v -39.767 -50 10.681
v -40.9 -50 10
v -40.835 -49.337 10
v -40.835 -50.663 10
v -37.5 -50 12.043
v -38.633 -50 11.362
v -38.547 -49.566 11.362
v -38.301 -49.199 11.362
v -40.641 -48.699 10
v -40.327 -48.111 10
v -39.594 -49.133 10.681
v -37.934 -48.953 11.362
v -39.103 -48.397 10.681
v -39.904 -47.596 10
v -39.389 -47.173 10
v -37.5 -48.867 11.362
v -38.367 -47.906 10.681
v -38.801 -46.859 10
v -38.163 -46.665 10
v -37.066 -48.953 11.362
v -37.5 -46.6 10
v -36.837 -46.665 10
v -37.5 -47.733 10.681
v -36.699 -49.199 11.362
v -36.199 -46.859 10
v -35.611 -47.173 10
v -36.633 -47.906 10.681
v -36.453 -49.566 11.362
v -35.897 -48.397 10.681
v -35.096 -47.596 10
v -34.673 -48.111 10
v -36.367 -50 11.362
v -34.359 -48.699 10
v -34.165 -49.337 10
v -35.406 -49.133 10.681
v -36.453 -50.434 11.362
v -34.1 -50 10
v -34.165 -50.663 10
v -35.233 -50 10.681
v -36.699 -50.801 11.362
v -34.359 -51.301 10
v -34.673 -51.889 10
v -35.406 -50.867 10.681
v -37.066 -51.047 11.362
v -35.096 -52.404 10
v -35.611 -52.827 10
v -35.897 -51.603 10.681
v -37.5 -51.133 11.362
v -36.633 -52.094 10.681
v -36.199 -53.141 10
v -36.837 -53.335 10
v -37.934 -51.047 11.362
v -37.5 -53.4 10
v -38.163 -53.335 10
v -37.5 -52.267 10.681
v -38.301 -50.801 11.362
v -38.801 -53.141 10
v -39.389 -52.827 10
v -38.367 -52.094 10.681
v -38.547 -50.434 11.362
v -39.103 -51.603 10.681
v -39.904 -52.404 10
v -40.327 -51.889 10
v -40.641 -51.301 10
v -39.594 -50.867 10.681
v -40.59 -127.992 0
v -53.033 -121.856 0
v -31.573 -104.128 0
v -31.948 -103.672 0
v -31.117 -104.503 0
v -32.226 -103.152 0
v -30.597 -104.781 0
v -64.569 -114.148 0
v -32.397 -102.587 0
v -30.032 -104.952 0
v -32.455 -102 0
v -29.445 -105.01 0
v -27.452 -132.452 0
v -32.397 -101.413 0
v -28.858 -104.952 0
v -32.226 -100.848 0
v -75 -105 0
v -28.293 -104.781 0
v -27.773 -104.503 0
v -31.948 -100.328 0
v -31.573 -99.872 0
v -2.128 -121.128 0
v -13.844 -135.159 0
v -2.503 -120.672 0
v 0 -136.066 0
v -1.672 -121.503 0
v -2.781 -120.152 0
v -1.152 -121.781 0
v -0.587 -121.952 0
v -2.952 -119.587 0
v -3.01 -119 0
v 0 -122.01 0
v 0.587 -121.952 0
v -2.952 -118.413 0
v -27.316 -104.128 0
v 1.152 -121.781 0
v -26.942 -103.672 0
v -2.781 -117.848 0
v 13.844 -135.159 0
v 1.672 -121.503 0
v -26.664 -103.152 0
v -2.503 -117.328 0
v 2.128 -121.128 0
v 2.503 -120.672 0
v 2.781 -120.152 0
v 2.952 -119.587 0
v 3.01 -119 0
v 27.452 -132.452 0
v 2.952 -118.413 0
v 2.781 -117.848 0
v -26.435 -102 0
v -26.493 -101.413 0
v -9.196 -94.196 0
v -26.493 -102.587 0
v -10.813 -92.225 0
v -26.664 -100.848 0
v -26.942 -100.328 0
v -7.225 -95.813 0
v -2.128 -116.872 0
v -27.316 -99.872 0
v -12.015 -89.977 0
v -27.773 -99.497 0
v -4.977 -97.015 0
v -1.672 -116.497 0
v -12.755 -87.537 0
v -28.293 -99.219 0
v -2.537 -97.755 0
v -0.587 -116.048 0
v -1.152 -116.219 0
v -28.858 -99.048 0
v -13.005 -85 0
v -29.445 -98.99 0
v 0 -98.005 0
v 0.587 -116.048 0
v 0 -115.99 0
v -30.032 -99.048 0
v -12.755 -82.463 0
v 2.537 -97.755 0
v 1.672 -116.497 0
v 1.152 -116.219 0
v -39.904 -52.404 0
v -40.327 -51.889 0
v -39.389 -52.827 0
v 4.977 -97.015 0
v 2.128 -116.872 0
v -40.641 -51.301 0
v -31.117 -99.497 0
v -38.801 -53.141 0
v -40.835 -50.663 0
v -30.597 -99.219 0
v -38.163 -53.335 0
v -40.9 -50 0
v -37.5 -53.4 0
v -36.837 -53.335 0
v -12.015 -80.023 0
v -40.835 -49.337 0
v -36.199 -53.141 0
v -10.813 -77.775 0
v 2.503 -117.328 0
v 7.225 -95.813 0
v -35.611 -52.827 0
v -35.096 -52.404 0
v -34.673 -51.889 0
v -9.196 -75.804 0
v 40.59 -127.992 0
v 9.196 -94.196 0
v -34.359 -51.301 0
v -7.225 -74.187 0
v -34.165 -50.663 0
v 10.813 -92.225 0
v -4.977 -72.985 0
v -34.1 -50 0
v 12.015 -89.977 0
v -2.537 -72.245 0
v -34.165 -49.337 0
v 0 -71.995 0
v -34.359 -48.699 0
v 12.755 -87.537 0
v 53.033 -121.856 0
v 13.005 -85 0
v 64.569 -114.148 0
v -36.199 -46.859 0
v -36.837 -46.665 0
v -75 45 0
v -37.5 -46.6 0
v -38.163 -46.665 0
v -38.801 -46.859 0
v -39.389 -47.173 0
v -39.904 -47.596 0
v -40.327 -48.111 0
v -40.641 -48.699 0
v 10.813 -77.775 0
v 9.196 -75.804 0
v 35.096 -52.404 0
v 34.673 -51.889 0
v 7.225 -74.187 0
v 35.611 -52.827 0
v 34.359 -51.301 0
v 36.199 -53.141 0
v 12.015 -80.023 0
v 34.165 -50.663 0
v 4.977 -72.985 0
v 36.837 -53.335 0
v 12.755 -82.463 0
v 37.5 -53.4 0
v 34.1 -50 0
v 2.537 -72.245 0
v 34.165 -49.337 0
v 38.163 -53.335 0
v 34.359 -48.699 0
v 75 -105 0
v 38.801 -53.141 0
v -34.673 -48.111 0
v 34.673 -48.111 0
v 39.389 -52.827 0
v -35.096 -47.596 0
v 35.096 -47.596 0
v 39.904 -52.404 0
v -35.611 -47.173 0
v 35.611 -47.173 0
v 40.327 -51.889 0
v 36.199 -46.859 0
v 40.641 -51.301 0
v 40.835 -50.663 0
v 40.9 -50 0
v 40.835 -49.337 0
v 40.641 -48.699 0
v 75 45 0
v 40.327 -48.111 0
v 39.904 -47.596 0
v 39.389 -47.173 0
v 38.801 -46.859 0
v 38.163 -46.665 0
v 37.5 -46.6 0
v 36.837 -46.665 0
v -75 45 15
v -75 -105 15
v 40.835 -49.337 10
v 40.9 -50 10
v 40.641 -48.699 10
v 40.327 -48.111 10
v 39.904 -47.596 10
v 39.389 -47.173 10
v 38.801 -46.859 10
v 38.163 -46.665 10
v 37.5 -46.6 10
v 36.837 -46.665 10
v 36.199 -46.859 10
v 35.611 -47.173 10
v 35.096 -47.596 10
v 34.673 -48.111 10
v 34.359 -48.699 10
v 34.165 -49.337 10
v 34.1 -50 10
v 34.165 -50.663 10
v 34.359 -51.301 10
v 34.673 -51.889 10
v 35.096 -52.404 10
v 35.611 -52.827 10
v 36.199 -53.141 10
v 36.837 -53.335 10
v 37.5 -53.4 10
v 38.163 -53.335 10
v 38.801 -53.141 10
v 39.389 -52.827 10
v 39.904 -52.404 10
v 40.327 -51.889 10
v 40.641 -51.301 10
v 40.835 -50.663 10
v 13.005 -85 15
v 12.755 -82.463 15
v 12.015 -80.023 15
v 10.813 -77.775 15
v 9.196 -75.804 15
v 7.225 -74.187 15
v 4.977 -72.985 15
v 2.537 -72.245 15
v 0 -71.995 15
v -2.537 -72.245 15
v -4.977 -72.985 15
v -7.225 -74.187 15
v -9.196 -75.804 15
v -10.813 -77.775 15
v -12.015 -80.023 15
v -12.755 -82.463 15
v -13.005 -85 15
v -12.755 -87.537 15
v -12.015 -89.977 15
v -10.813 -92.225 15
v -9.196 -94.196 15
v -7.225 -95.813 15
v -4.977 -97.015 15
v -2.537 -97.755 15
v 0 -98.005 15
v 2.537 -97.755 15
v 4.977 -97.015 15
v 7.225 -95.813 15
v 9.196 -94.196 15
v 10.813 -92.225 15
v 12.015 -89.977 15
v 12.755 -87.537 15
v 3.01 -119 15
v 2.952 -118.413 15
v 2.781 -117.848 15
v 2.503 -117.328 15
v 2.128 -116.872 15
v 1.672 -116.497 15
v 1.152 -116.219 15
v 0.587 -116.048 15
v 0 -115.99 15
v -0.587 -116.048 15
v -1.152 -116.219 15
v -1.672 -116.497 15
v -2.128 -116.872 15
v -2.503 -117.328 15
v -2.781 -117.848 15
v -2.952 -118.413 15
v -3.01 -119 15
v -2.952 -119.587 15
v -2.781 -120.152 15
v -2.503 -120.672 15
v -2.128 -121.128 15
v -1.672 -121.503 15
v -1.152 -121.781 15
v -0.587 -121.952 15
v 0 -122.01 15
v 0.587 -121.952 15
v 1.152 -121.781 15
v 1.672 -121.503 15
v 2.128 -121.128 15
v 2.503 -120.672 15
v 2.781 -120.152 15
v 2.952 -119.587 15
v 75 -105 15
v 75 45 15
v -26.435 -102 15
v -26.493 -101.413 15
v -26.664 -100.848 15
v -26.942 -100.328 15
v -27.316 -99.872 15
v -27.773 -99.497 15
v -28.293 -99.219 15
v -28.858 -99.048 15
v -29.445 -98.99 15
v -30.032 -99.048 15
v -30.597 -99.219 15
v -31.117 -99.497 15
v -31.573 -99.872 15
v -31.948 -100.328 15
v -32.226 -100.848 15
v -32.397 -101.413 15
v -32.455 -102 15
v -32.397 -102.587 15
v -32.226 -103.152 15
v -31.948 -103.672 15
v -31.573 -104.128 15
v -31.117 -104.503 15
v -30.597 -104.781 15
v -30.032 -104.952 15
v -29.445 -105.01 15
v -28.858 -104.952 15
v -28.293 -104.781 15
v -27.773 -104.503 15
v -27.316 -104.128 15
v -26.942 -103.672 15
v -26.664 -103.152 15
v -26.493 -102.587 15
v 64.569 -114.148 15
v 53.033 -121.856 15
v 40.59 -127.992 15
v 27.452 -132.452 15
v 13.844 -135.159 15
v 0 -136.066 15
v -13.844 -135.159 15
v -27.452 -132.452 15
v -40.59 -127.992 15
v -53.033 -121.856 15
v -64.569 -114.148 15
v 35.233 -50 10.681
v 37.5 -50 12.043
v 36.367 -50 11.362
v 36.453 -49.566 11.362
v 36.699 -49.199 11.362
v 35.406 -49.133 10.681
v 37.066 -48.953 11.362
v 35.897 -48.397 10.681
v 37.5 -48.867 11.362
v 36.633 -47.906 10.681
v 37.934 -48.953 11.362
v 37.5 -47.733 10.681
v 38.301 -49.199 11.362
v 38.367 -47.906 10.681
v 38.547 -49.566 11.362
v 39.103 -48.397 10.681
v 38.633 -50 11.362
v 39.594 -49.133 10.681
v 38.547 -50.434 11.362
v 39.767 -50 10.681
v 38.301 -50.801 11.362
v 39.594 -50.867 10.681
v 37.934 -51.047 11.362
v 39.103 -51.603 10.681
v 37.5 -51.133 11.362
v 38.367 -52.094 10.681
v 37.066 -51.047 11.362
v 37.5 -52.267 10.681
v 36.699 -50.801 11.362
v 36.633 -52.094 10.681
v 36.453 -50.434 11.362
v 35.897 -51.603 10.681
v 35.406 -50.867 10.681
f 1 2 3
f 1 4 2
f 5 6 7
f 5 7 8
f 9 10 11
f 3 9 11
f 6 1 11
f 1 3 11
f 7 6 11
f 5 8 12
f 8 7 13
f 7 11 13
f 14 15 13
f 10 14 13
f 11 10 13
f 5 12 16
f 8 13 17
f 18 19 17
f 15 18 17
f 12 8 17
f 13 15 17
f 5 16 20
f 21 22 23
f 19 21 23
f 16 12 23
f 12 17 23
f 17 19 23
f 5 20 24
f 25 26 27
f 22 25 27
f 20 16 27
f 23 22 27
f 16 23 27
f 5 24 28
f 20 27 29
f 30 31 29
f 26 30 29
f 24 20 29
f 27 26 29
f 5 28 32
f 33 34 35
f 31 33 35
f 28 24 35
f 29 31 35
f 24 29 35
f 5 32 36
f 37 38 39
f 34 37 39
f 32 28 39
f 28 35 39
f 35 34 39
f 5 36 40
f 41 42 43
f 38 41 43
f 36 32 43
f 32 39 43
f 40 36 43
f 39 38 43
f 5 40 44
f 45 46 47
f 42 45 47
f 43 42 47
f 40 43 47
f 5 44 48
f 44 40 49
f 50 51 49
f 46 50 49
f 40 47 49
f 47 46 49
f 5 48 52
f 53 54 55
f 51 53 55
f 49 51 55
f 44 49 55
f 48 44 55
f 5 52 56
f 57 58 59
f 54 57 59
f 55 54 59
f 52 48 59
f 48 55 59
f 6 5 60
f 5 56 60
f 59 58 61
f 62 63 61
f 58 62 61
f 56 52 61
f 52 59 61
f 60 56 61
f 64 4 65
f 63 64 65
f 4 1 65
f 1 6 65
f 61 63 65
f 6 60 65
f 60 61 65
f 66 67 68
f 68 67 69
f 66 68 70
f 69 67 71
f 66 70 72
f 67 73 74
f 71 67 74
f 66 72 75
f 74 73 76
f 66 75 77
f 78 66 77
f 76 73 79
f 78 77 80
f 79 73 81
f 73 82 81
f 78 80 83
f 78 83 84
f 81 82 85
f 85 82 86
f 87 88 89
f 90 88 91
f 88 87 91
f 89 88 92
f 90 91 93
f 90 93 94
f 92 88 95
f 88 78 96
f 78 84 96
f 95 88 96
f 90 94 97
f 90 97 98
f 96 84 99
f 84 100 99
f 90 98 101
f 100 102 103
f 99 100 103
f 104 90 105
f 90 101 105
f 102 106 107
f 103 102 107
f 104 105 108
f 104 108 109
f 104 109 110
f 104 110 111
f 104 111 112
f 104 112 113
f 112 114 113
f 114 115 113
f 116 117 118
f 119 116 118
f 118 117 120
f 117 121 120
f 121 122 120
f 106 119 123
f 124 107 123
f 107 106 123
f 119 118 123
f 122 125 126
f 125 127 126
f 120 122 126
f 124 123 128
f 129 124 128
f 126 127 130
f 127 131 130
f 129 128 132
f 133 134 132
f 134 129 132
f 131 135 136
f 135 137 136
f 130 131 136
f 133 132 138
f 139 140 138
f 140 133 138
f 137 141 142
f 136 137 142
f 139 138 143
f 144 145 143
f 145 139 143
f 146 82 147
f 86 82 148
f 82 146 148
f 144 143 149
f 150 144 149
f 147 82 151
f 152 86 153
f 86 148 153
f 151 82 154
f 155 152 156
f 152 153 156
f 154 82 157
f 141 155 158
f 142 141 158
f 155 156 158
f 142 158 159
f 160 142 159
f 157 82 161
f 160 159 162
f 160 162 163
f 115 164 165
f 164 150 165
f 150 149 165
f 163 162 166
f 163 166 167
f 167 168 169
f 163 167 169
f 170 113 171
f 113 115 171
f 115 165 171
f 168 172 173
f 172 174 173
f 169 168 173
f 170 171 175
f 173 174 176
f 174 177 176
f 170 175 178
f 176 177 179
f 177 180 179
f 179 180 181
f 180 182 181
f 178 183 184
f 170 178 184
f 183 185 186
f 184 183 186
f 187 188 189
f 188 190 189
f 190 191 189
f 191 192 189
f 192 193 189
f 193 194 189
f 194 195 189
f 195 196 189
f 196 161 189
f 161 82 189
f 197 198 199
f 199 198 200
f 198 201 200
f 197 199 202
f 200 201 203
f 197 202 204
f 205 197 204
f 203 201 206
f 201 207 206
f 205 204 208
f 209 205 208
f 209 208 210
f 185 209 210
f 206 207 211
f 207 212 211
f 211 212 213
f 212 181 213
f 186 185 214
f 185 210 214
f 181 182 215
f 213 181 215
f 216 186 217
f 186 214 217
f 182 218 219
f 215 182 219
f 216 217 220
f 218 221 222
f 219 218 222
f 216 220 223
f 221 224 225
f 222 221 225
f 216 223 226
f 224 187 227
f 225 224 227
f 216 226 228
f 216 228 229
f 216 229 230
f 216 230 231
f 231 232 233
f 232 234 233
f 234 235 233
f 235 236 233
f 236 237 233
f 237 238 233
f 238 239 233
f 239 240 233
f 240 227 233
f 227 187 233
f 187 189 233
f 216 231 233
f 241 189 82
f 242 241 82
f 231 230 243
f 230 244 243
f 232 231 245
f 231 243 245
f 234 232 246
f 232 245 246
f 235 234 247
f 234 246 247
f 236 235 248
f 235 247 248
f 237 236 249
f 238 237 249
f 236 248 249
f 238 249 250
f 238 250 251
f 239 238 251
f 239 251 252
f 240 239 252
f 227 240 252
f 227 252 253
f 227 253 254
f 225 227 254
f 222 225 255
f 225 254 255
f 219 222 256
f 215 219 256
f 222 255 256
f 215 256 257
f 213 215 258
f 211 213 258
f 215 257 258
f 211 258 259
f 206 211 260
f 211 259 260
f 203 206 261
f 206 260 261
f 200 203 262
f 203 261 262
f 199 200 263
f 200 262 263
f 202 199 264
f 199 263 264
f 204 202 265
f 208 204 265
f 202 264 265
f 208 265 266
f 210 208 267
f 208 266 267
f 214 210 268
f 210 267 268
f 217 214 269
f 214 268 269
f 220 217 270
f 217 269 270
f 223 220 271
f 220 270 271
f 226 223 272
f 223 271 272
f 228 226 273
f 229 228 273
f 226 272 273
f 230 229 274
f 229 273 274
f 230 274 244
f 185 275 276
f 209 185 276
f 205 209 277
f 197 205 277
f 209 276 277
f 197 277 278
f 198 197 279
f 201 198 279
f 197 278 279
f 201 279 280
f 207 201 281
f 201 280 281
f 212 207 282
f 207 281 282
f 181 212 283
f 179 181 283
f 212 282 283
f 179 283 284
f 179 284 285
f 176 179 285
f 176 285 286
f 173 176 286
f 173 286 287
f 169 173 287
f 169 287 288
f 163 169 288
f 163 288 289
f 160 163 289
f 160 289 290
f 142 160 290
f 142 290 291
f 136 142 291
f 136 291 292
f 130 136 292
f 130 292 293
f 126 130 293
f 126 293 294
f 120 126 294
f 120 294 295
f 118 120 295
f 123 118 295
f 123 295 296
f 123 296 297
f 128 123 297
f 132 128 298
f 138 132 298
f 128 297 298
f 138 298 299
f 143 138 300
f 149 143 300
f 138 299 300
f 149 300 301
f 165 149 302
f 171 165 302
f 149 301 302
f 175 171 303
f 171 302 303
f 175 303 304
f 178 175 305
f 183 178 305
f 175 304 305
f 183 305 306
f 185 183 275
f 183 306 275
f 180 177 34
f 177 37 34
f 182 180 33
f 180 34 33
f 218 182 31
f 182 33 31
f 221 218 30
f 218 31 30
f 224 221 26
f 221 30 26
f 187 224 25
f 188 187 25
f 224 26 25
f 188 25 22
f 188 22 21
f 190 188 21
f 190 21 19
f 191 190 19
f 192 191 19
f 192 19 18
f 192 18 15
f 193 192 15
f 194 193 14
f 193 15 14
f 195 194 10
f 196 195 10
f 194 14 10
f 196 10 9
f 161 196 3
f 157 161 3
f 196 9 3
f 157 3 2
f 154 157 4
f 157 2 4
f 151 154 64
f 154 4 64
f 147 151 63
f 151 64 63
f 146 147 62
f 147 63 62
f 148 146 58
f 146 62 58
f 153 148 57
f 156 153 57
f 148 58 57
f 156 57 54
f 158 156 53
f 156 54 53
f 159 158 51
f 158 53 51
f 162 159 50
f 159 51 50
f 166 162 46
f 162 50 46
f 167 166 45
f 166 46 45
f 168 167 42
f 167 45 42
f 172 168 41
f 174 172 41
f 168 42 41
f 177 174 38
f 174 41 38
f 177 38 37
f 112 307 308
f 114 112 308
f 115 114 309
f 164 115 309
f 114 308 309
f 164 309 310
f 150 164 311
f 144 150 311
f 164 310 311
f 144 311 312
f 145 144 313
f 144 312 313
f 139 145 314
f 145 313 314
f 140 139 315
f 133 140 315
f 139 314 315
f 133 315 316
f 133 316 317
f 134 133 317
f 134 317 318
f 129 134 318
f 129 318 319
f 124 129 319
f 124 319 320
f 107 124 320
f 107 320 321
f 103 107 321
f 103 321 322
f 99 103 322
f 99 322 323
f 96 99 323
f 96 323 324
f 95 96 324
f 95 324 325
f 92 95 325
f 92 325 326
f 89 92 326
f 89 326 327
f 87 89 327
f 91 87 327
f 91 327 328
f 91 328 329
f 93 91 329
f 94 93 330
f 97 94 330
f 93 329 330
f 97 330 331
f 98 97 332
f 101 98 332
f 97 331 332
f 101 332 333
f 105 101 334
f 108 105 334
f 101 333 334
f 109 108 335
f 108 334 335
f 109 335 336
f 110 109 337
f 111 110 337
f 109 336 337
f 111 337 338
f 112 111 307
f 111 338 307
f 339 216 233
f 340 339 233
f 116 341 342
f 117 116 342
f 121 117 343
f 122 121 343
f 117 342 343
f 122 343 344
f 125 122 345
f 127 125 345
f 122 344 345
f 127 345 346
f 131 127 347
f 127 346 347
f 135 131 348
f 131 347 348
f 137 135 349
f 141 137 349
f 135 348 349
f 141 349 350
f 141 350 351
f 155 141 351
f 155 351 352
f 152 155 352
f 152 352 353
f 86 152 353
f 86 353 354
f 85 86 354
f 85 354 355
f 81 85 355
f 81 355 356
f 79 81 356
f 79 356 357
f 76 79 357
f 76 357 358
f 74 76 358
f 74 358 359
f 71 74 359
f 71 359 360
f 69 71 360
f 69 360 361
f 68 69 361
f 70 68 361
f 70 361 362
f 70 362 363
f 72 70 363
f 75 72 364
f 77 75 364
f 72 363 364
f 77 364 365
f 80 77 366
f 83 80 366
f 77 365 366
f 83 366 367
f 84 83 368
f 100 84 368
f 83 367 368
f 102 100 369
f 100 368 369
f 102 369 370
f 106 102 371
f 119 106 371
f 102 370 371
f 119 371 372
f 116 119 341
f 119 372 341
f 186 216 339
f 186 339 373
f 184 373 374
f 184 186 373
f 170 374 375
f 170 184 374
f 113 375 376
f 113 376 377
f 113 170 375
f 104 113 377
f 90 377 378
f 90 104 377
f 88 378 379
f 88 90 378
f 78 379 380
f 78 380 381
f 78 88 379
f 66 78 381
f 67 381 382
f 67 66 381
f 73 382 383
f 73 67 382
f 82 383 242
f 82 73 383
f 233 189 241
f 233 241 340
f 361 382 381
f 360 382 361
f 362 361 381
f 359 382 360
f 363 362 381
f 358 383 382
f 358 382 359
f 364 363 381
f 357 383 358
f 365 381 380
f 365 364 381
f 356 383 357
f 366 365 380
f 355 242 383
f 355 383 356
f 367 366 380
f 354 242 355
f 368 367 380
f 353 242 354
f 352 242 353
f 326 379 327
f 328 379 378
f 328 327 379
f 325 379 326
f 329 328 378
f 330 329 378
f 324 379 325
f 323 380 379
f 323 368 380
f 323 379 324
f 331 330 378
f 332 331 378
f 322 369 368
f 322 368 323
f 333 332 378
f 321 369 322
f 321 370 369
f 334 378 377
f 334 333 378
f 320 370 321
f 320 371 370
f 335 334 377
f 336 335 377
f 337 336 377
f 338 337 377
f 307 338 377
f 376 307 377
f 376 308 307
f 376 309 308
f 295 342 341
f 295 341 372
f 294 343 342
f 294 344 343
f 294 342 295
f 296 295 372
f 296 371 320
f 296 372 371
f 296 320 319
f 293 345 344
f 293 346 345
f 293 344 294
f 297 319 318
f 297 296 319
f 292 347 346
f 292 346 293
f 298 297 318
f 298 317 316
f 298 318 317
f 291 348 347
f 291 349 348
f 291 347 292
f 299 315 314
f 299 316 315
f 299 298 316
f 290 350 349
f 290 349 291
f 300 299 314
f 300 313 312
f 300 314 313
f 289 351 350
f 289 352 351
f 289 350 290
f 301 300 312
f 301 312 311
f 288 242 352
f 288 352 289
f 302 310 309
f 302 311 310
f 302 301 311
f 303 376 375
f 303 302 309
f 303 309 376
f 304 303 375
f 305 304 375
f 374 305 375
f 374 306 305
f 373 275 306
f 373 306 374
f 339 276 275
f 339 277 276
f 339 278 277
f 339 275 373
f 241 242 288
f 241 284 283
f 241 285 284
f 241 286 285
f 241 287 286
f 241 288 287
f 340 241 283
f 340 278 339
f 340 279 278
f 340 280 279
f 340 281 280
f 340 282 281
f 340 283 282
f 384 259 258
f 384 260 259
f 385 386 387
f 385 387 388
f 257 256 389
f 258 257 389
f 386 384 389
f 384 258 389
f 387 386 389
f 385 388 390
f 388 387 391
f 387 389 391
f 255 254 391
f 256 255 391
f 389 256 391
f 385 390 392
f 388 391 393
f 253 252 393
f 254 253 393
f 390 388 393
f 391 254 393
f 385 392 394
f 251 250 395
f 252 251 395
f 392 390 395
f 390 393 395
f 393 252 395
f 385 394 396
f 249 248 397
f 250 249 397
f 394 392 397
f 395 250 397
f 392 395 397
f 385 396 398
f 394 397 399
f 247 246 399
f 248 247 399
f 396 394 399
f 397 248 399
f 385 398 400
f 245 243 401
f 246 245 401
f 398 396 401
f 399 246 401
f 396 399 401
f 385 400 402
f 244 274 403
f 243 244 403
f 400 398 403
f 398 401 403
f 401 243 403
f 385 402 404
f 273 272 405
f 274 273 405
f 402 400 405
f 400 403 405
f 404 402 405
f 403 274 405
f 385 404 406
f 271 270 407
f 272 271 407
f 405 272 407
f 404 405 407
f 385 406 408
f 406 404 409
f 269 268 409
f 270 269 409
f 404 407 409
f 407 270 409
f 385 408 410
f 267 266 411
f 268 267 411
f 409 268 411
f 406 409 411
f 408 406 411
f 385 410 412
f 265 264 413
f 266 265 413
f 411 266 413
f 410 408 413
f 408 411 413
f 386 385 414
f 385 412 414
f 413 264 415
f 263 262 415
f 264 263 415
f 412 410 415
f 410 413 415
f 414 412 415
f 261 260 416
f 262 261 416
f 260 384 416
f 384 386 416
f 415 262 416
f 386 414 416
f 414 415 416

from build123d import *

# Parameters (mm, degrees)
SKETCH2_W                        = 150
SKETCH2_H                        = 90
SKETCH2_H_2                      = 60
BOSS_EXTRUDE1_DEPTH              = 15
SKETCH3_R                        = 13.005
SKETCH3_R_2                      = 3.01
CUT_EXTRUDE1_DEPTH               = 16
TAP_DRILL_FOR_M8X1_25_TAP1_D     = 6.8
TAP_DRILL_FOR_M8X1_25_TAP1_DEPTH = 10
TAP_DRILL_FOR_M8X1_25_TAP1_TIP   = 2.042926105


with BuildPart() as part:
    # Sketch2 → Boss-Extrude1 (new body)
    with BuildSketch(Plane.XY):
        Rectangle(SKETCH2_W, SKETCH2_H)
        with Locations((0, -75)):
            Rectangle(SKETCH2_W, SKETCH2_H_2)
        with BuildLine():
            Line((-75, -105), (75, -105))
            ThreePointArc((75, -105), (0, -136.066017178), (-75, -105))
        make_face()
    extrude(amount=BOSS_EXTRUDE1_DEPTH)

    # Sketch3 → Cut-Extrude1 (cut, through all)
    with BuildSketch(Plane.XY.offset(15)):
        with Locations((0, -85)):
            Circle(SKETCH3_R)
        with Locations((-29.444863729, -102)):
            Circle(SKETCH3_R_2)
        with Locations((0, -119)):
            Circle(SKETCH3_R_2)
    extrude(amount=-CUT_EXTRUDE1_DEPTH, mode=Mode.SUBTRACT)

    # Tap Drill for M8x1.25 Tap1
    with Locations(Plane(origin=(0, 0, 0), x_dir=(-1, 0, 0), z_dir=(0, 0, -1))):
        with Locations((-37.5, -50), (37.5, -50)):
            Hole(TAP_DRILL_FOR_M8X1_25_TAP1_D / 2, depth=TAP_DRILL_FOR_M8X1_25_TAP1_DEPTH)
            with Locations((0, 0, -(TAP_DRILL_FOR_M8X1_25_TAP1_DEPTH + TAP_DRILL_FOR_M8X1_25_TAP1_TIP / 2))):  # 118° drill point
                Cone(0, TAP_DRILL_FOR_M8X1_25_TAP1_D / 2, TAP_DRILL_FOR_M8X1_25_TAP1_TIP, mode=Mode.SUBTRACT)


solid = part.part
